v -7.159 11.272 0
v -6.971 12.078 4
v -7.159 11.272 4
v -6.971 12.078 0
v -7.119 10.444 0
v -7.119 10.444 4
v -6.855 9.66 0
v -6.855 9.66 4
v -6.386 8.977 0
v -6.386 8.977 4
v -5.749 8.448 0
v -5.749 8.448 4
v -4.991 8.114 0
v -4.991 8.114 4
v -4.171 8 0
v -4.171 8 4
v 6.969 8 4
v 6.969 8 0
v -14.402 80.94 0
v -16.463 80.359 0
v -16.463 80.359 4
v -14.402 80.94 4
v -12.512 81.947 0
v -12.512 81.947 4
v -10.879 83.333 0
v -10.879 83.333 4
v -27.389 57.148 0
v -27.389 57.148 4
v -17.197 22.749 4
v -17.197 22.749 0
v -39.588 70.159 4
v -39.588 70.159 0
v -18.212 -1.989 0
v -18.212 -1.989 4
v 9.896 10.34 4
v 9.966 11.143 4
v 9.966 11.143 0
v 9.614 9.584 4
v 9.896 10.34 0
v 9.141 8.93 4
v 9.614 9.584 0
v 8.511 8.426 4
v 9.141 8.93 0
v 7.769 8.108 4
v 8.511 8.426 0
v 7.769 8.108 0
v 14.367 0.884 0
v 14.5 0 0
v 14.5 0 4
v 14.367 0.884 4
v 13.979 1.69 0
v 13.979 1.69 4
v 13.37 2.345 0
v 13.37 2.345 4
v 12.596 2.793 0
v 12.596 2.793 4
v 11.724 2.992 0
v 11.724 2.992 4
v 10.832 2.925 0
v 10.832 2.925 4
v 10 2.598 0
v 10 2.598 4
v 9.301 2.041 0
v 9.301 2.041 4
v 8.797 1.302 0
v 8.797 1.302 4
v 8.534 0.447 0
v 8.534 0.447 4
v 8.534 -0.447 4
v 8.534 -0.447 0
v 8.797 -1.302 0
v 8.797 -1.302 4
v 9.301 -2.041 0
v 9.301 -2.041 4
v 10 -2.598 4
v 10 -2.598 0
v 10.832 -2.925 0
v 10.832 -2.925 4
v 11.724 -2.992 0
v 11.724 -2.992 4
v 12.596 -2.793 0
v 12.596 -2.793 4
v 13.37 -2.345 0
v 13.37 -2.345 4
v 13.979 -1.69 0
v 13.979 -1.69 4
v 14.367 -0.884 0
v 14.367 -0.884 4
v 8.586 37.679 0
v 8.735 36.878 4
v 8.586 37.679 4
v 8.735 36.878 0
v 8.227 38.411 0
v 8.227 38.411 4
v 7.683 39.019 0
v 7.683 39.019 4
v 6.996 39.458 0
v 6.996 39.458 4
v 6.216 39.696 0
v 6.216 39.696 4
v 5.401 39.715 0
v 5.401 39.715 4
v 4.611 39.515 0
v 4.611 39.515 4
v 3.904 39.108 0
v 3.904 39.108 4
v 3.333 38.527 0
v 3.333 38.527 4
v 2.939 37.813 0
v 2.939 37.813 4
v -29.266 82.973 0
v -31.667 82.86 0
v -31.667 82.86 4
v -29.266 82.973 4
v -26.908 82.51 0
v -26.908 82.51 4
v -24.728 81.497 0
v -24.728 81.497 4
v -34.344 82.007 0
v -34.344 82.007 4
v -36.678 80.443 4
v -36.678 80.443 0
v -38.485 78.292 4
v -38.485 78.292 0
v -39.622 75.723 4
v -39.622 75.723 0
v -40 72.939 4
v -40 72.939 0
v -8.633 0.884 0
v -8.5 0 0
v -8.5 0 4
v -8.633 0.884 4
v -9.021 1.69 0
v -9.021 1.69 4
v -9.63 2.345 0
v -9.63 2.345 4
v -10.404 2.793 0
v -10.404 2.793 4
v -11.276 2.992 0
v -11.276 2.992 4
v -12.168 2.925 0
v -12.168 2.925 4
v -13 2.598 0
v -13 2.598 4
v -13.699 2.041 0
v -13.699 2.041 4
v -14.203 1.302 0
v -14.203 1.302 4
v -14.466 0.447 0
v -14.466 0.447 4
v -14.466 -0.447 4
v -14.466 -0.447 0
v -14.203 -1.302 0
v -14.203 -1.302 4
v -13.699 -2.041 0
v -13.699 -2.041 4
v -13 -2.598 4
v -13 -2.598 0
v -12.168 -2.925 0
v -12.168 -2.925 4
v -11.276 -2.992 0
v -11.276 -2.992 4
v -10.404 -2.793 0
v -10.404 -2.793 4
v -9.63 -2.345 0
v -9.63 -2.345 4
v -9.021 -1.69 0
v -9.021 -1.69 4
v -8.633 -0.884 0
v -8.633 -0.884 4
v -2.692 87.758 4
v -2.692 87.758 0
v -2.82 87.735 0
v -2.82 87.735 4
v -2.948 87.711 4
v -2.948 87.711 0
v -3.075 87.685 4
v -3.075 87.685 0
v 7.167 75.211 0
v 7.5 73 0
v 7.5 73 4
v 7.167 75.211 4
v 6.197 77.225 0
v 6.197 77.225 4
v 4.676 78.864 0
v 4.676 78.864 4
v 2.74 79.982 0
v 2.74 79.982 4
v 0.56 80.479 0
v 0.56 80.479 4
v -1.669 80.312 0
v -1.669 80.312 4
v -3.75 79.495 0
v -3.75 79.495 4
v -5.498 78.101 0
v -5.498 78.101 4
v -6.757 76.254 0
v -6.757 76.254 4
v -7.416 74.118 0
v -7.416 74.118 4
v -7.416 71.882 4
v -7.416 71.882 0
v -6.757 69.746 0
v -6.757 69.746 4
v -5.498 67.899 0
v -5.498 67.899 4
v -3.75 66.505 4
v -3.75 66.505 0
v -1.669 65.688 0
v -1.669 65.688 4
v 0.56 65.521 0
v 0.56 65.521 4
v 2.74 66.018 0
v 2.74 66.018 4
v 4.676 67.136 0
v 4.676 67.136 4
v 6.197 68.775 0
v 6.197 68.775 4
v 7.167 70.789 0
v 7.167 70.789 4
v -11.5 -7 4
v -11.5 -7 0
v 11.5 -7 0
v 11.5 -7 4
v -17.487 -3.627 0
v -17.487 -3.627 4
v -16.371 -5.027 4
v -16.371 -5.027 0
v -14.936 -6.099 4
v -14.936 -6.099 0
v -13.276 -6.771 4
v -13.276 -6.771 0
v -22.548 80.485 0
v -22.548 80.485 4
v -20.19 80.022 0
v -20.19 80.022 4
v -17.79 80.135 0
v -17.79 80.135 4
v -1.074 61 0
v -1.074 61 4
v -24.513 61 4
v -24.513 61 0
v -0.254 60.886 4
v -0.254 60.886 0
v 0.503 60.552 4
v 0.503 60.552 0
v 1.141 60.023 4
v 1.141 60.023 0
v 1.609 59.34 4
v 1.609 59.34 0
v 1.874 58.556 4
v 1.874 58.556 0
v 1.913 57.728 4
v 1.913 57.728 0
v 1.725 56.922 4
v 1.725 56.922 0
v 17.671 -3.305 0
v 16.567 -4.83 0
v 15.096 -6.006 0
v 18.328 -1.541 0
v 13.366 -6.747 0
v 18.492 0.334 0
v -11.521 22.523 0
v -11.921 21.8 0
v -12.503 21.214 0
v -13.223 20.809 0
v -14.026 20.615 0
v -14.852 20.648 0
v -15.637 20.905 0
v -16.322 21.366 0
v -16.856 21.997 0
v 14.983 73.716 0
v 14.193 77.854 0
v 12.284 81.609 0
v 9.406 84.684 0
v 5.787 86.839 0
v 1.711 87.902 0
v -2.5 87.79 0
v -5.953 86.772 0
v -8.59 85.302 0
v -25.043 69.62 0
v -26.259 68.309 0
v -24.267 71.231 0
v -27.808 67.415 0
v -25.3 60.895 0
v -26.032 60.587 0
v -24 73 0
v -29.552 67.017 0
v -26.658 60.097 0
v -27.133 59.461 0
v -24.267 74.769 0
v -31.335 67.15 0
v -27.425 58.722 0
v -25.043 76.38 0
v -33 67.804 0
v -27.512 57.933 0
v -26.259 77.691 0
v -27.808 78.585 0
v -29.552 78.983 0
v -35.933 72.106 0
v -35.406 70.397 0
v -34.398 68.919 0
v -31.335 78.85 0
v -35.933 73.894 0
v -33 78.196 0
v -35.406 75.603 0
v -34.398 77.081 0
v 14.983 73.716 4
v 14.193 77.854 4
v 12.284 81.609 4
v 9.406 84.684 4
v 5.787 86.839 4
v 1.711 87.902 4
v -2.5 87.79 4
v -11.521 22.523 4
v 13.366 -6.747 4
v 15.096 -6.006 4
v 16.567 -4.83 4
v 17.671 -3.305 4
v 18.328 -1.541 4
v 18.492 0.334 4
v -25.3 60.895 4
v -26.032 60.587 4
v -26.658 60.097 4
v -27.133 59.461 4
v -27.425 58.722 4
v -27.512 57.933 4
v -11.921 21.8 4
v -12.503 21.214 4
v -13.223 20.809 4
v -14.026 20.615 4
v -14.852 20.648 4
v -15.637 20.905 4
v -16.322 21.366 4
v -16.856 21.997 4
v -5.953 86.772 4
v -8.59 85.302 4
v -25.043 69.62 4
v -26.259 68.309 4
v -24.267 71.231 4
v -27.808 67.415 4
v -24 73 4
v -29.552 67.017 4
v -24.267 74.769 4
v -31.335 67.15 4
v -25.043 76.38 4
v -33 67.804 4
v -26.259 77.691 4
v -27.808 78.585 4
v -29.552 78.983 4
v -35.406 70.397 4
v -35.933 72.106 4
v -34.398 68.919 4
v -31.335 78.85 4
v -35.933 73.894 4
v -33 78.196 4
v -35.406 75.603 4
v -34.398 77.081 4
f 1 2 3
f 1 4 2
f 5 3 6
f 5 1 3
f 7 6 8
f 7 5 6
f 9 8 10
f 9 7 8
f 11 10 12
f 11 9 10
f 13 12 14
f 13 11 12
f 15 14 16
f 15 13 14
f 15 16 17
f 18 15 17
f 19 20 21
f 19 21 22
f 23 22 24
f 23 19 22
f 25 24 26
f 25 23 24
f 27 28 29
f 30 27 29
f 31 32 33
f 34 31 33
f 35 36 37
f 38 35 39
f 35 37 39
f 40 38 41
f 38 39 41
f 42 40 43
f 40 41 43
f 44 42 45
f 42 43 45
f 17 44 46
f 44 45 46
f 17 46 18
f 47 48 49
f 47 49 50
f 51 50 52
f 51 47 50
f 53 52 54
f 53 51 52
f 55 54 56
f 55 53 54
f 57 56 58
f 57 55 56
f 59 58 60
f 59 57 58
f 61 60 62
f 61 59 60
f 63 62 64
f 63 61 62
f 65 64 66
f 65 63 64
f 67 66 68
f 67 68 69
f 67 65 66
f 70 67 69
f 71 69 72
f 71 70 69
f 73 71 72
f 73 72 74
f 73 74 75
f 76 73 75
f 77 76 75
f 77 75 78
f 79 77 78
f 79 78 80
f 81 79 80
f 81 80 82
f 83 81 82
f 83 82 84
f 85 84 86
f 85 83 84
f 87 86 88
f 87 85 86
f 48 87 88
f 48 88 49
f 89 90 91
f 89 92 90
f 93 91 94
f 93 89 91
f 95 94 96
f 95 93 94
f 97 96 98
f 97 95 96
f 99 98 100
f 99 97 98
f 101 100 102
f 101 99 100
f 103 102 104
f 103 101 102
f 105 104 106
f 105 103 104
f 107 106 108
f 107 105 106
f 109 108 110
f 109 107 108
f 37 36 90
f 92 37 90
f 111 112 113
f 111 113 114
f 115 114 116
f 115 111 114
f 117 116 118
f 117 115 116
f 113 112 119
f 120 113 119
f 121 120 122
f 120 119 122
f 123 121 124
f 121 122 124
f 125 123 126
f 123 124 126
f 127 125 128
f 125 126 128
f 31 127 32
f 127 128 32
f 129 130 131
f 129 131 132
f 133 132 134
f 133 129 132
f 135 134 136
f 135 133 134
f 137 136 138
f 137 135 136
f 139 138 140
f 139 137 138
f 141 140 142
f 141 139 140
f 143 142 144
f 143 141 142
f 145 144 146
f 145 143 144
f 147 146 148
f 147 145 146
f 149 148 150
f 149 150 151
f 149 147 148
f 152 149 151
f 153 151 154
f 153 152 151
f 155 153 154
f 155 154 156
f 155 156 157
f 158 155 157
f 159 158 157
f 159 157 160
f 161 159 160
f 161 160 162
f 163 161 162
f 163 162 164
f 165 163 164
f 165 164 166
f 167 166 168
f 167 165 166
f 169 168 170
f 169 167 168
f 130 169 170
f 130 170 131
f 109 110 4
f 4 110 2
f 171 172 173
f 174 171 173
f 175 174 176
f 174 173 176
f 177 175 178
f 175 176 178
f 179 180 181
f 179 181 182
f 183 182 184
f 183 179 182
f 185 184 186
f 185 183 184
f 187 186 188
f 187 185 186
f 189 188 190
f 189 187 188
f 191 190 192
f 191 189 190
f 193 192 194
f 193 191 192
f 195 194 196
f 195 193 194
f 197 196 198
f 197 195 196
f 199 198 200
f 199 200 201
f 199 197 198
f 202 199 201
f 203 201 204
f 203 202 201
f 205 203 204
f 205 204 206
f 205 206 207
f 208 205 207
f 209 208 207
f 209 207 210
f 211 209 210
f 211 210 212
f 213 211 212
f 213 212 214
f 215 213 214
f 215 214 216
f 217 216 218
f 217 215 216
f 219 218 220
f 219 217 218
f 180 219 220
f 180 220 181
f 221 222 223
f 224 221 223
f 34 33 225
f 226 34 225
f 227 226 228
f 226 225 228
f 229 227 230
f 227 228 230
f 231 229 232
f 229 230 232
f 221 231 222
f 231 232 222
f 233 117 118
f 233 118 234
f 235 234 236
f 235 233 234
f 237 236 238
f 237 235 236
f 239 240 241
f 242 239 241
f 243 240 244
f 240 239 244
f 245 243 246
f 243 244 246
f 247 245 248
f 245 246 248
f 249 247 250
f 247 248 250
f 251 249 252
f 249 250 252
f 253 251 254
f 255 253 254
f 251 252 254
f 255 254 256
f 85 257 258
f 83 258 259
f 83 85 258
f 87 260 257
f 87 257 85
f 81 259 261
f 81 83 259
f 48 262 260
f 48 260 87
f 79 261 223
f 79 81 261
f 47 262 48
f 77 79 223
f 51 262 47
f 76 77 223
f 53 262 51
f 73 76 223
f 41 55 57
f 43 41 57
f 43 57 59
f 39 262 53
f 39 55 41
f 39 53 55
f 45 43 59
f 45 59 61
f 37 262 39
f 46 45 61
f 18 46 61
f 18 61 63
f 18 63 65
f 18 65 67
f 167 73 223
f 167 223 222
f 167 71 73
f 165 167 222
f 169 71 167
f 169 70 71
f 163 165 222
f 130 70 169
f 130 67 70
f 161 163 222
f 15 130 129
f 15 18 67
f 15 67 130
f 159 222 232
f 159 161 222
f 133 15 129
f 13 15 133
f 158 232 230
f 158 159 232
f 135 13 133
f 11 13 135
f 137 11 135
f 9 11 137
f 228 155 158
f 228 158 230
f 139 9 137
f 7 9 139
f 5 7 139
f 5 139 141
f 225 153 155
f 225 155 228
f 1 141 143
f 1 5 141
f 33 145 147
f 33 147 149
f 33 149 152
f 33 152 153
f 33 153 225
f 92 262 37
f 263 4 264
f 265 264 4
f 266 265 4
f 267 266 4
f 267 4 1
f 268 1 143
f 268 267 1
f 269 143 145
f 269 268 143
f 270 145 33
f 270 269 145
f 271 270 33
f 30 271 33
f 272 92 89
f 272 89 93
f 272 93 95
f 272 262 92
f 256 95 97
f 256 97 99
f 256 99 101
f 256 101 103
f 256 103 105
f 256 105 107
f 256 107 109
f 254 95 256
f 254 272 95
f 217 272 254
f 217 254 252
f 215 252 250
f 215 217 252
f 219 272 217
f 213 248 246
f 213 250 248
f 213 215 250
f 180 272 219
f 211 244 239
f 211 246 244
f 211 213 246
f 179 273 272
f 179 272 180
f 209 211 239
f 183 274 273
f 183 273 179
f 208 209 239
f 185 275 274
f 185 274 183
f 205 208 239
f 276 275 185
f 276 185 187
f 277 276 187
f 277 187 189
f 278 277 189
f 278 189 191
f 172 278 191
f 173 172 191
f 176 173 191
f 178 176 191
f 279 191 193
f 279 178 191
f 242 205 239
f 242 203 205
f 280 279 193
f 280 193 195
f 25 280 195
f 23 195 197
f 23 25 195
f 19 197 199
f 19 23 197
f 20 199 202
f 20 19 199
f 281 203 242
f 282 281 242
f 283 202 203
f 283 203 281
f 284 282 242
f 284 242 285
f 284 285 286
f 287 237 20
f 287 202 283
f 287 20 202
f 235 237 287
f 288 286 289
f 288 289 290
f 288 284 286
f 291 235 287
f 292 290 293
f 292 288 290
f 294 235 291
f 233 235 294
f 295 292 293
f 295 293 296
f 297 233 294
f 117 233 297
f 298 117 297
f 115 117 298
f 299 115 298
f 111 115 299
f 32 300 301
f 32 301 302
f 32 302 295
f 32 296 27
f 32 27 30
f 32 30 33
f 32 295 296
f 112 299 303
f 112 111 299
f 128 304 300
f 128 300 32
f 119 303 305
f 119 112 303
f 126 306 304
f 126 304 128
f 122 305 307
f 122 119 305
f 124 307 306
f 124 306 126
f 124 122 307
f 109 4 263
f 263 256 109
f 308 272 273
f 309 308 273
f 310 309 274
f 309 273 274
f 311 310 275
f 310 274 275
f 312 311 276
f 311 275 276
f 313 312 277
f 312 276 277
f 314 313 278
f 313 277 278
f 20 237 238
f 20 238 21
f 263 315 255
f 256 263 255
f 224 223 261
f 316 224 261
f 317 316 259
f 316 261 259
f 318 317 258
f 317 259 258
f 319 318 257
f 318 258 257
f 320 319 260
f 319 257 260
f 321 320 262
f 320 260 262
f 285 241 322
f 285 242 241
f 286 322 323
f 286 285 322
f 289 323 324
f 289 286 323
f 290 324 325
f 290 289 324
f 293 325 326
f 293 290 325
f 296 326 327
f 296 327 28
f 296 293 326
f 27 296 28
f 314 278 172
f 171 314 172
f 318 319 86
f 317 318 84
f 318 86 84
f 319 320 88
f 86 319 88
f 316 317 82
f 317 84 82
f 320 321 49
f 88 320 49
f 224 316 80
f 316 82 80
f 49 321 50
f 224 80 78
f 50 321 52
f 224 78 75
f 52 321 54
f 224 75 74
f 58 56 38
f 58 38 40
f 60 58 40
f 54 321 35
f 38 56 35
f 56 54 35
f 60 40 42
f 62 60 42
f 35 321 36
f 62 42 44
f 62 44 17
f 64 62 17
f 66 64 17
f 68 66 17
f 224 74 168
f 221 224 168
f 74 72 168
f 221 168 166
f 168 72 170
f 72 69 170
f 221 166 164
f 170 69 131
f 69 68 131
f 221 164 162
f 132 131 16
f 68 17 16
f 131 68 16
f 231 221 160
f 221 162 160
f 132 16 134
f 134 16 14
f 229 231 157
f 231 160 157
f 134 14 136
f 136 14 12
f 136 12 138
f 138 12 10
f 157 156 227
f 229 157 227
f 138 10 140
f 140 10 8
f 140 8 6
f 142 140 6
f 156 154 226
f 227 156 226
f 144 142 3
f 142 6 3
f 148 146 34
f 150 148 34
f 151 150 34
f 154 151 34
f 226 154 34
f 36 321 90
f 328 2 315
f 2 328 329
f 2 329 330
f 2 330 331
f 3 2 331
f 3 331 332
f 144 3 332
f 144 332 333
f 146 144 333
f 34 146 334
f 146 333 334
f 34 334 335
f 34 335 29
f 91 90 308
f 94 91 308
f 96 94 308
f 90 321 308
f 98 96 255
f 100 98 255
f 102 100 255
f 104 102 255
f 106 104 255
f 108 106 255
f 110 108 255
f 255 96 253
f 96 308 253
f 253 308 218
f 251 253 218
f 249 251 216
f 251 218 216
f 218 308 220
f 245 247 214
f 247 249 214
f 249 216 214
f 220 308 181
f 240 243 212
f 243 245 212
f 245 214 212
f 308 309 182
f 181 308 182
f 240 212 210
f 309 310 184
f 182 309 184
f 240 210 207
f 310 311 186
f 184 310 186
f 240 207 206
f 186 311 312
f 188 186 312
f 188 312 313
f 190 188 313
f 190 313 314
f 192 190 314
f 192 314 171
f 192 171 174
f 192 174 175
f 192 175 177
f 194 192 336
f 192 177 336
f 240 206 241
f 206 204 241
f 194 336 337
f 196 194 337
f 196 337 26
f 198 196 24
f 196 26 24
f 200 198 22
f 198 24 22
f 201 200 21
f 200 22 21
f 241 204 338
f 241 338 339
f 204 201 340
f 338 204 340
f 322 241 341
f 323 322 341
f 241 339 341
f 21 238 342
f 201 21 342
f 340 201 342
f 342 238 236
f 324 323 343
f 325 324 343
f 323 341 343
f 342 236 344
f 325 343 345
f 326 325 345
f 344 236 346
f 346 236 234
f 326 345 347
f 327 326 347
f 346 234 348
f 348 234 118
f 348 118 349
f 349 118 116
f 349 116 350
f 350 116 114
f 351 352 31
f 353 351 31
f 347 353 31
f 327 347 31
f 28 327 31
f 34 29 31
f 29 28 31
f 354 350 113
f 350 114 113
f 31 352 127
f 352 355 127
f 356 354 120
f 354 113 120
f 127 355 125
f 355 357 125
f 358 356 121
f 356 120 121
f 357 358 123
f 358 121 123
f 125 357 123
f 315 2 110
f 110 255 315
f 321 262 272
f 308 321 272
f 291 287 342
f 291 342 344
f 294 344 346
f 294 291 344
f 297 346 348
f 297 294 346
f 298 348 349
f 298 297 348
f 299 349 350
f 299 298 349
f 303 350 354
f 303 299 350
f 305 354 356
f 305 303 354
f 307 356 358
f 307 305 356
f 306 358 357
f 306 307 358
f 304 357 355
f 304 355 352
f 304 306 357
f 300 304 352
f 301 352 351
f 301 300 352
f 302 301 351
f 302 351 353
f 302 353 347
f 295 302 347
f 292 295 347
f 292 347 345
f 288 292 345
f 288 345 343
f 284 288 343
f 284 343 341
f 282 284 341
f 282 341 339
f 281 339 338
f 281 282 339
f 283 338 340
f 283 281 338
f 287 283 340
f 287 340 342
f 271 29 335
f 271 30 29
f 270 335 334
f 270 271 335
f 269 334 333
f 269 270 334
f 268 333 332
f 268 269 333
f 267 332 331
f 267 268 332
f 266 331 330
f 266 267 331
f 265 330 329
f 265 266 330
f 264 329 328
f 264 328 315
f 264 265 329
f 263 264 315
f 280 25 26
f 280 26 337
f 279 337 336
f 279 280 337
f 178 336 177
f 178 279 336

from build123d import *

# Parameters (mm, degrees)
SKETCH_1_R          = 3
SKETCH_1_R_2        = 7.5
SKETCH_1_R_3        = 6
EXTRUDE_1_DEPTH     = 4
CUT_EXTRUDE_START   = -10
CUT_EXTRUDE_2_DEPTH = 10
CUT_EXTRUDE_6_DEPTH = 10
FILLET_8_R          = 3
FILLET_9_R          = 10


with BuildPart() as part:
    # 草图1 → 凸台-拉伸1 (new body)
    with BuildSketch(Plane.XY):
        with BuildLine():
            Line((-39.588006912, 70.159203728), (-18.211604838, -1.988557391))
            ThreePointArc((-18.211604838, -1.988557391), (-15.688084184, -5.608917085), (-11.5, -7))
            Line((-11.5, -7), (11.5, -7))
            ThreePointArc((11.5, -7), (16.566581898, -4.83008777), (18.492010075, 0.334357752))
            Line((18.492010075, 0.334357752), (14.982878733, 73.716480896))
            ThreePointArc((14.982878733, 73.716480896), (9.406006267, 84.684478854), (-2.5, 87.790199458))
            Line((-2.5, 87.790199458), (-31.666666667, 82.860132972))
            ThreePointArc((-31.666666667, 82.860132972), (-38.485005613, 78.291944798), (-39.588006912, 70.159203728))
        make_face()
        with Locations((11.5, 0)):
            Circle(SKETCH_1_R, mode=Mode.SUBTRACT)
        with Locations((-11.5, 0)):
            Circle(SKETCH_1_R, mode=Mode.SUBTRACT)
        with Locations((0, 73)):
            Circle(SKETCH_1_R_2, mode=Mode.SUBTRACT)
        with Locations((-30, 73)):
            Circle(SKETCH_1_R_3, mode=Mode.SUBTRACT)
    extrude(amount=EXTRUDE_1_DEPTH)

    # 草图3 → 切除-拉伸2 (cut)
    with BuildSketch(Plane.XY.offset(4).offset(CUT_EXTRUDE_START)):
        with BuildLine():
            Line((-22.294207695, 79.373442159), (-12.695653982, 80.995893861))
            ThreePointArc((-12.695653982, 80.995893861), (-8.463678603, 85.388708293), (-2.832841434, 87.733938987))
            Line((-2.832841434, 87.733938987), (-31.666666667, 82.860132972))
            ThreePointArc((-31.666666667, 82.860132972), (-26.513309187, 82.372458972), (-22.294207695, 79.373442159))
        make_face()
    extrude(amount=CUT_EXTRUDE_2_DEPTH, mode=Mode.SUBTRACT)

    # 草图7 → 切除-拉伸6 (cut)
    with BuildSketch(Plane.XY.offset(4)):
        Polygon((3.295515487, 61), (-28.530502179, 61), (-14.691197263, 14.290789455), align=None)
        Polygon((10.116297473, 8), (8.055325934, 51.098548475), (-8.540998481, 8), align=None)
    extrude(amount=-CUT_EXTRUDE_6_DEPTH, mode=Mode.SUBTRACT)

    # 圆角8
    fillet_8_edges = [part.edges().sort_by_distance(p)[0] for p in [
        (8.055325934, 51.098548475, 2),
        (10.116297473, 8, 2),
        (-8.540998481, 8, 2),
        (3.295515487, 61, 2),
        (-14.691197263, 14.290789455, 2),
        (-28.530502179, 61, 2),
    ]]
    fillet(fillet_8_edges, radius=FILLET_8_R)

    # 圆角9
    # the kernel refuses this fillet: 10 mm, written as the material it adds along each edge
    with BuildSketch(Plane(origin=(-12.695653982, 80.995893861, 0), x_dir=(0.613787273879612, 0.789471457636965, 0), z_dir=(0, 0, 1))) as fillet_9_piece_1:
        with BuildLine():
            CenterArc((3.946152578, 9.951236707), FILLET_9_R, 227.457922435, 36.881499563)
            Line((-2.815162182, 2.583426808), (0, 0))
            ThreePointArc((0, 0), (1.479900866, 0.073163458), (2.959801732, 0))
        make_face()
    extrude(amount=4)
    with BuildSketch(Plane(origin=(-22.294207695, 79.373442159, 0), x_dir=(0.9860132971832692, 0.16666666666666718, 0), z_dir=(0, 0, 1))) as fillet_9_piece_2:
        with BuildLine():
            CenterArc((4.568502517, 10), FILLET_9_R, 228.590377891, 41.409622109)
            ThreePointArc((-2.04587576, 2.5), (-0.921320126, 1.33315892), (0, 0))
            Line((0, 0), (4.568502517, 0))
        make_face()
    extrude(amount=4)
    # the kernel refuses this fillet: 10 mm, written as the material it takes off along each edge
    with BuildSketch(Plane(origin=(-2.832841434, 87.733938987, -0.617519745), x_dir=(0.9860132971832704, 0.16666666666666025, 0), z_dir=(0, 0, 1))) as fillet_9_2_piece_1:
        with BuildLine():
            CenterArc((0.14264617, -10), FILLET_9_R, 90, 2.232449915)
            ThreePointArc((-0.246891263, -0.007589851), (-0.123461251, -0.003286845), (0, 0))
            Line((0, 0), (0.14264617, 0))
        make_face()
    extrude(amount=5.23503949, mode=Mode.SUBTRACT)


solid = part.part
